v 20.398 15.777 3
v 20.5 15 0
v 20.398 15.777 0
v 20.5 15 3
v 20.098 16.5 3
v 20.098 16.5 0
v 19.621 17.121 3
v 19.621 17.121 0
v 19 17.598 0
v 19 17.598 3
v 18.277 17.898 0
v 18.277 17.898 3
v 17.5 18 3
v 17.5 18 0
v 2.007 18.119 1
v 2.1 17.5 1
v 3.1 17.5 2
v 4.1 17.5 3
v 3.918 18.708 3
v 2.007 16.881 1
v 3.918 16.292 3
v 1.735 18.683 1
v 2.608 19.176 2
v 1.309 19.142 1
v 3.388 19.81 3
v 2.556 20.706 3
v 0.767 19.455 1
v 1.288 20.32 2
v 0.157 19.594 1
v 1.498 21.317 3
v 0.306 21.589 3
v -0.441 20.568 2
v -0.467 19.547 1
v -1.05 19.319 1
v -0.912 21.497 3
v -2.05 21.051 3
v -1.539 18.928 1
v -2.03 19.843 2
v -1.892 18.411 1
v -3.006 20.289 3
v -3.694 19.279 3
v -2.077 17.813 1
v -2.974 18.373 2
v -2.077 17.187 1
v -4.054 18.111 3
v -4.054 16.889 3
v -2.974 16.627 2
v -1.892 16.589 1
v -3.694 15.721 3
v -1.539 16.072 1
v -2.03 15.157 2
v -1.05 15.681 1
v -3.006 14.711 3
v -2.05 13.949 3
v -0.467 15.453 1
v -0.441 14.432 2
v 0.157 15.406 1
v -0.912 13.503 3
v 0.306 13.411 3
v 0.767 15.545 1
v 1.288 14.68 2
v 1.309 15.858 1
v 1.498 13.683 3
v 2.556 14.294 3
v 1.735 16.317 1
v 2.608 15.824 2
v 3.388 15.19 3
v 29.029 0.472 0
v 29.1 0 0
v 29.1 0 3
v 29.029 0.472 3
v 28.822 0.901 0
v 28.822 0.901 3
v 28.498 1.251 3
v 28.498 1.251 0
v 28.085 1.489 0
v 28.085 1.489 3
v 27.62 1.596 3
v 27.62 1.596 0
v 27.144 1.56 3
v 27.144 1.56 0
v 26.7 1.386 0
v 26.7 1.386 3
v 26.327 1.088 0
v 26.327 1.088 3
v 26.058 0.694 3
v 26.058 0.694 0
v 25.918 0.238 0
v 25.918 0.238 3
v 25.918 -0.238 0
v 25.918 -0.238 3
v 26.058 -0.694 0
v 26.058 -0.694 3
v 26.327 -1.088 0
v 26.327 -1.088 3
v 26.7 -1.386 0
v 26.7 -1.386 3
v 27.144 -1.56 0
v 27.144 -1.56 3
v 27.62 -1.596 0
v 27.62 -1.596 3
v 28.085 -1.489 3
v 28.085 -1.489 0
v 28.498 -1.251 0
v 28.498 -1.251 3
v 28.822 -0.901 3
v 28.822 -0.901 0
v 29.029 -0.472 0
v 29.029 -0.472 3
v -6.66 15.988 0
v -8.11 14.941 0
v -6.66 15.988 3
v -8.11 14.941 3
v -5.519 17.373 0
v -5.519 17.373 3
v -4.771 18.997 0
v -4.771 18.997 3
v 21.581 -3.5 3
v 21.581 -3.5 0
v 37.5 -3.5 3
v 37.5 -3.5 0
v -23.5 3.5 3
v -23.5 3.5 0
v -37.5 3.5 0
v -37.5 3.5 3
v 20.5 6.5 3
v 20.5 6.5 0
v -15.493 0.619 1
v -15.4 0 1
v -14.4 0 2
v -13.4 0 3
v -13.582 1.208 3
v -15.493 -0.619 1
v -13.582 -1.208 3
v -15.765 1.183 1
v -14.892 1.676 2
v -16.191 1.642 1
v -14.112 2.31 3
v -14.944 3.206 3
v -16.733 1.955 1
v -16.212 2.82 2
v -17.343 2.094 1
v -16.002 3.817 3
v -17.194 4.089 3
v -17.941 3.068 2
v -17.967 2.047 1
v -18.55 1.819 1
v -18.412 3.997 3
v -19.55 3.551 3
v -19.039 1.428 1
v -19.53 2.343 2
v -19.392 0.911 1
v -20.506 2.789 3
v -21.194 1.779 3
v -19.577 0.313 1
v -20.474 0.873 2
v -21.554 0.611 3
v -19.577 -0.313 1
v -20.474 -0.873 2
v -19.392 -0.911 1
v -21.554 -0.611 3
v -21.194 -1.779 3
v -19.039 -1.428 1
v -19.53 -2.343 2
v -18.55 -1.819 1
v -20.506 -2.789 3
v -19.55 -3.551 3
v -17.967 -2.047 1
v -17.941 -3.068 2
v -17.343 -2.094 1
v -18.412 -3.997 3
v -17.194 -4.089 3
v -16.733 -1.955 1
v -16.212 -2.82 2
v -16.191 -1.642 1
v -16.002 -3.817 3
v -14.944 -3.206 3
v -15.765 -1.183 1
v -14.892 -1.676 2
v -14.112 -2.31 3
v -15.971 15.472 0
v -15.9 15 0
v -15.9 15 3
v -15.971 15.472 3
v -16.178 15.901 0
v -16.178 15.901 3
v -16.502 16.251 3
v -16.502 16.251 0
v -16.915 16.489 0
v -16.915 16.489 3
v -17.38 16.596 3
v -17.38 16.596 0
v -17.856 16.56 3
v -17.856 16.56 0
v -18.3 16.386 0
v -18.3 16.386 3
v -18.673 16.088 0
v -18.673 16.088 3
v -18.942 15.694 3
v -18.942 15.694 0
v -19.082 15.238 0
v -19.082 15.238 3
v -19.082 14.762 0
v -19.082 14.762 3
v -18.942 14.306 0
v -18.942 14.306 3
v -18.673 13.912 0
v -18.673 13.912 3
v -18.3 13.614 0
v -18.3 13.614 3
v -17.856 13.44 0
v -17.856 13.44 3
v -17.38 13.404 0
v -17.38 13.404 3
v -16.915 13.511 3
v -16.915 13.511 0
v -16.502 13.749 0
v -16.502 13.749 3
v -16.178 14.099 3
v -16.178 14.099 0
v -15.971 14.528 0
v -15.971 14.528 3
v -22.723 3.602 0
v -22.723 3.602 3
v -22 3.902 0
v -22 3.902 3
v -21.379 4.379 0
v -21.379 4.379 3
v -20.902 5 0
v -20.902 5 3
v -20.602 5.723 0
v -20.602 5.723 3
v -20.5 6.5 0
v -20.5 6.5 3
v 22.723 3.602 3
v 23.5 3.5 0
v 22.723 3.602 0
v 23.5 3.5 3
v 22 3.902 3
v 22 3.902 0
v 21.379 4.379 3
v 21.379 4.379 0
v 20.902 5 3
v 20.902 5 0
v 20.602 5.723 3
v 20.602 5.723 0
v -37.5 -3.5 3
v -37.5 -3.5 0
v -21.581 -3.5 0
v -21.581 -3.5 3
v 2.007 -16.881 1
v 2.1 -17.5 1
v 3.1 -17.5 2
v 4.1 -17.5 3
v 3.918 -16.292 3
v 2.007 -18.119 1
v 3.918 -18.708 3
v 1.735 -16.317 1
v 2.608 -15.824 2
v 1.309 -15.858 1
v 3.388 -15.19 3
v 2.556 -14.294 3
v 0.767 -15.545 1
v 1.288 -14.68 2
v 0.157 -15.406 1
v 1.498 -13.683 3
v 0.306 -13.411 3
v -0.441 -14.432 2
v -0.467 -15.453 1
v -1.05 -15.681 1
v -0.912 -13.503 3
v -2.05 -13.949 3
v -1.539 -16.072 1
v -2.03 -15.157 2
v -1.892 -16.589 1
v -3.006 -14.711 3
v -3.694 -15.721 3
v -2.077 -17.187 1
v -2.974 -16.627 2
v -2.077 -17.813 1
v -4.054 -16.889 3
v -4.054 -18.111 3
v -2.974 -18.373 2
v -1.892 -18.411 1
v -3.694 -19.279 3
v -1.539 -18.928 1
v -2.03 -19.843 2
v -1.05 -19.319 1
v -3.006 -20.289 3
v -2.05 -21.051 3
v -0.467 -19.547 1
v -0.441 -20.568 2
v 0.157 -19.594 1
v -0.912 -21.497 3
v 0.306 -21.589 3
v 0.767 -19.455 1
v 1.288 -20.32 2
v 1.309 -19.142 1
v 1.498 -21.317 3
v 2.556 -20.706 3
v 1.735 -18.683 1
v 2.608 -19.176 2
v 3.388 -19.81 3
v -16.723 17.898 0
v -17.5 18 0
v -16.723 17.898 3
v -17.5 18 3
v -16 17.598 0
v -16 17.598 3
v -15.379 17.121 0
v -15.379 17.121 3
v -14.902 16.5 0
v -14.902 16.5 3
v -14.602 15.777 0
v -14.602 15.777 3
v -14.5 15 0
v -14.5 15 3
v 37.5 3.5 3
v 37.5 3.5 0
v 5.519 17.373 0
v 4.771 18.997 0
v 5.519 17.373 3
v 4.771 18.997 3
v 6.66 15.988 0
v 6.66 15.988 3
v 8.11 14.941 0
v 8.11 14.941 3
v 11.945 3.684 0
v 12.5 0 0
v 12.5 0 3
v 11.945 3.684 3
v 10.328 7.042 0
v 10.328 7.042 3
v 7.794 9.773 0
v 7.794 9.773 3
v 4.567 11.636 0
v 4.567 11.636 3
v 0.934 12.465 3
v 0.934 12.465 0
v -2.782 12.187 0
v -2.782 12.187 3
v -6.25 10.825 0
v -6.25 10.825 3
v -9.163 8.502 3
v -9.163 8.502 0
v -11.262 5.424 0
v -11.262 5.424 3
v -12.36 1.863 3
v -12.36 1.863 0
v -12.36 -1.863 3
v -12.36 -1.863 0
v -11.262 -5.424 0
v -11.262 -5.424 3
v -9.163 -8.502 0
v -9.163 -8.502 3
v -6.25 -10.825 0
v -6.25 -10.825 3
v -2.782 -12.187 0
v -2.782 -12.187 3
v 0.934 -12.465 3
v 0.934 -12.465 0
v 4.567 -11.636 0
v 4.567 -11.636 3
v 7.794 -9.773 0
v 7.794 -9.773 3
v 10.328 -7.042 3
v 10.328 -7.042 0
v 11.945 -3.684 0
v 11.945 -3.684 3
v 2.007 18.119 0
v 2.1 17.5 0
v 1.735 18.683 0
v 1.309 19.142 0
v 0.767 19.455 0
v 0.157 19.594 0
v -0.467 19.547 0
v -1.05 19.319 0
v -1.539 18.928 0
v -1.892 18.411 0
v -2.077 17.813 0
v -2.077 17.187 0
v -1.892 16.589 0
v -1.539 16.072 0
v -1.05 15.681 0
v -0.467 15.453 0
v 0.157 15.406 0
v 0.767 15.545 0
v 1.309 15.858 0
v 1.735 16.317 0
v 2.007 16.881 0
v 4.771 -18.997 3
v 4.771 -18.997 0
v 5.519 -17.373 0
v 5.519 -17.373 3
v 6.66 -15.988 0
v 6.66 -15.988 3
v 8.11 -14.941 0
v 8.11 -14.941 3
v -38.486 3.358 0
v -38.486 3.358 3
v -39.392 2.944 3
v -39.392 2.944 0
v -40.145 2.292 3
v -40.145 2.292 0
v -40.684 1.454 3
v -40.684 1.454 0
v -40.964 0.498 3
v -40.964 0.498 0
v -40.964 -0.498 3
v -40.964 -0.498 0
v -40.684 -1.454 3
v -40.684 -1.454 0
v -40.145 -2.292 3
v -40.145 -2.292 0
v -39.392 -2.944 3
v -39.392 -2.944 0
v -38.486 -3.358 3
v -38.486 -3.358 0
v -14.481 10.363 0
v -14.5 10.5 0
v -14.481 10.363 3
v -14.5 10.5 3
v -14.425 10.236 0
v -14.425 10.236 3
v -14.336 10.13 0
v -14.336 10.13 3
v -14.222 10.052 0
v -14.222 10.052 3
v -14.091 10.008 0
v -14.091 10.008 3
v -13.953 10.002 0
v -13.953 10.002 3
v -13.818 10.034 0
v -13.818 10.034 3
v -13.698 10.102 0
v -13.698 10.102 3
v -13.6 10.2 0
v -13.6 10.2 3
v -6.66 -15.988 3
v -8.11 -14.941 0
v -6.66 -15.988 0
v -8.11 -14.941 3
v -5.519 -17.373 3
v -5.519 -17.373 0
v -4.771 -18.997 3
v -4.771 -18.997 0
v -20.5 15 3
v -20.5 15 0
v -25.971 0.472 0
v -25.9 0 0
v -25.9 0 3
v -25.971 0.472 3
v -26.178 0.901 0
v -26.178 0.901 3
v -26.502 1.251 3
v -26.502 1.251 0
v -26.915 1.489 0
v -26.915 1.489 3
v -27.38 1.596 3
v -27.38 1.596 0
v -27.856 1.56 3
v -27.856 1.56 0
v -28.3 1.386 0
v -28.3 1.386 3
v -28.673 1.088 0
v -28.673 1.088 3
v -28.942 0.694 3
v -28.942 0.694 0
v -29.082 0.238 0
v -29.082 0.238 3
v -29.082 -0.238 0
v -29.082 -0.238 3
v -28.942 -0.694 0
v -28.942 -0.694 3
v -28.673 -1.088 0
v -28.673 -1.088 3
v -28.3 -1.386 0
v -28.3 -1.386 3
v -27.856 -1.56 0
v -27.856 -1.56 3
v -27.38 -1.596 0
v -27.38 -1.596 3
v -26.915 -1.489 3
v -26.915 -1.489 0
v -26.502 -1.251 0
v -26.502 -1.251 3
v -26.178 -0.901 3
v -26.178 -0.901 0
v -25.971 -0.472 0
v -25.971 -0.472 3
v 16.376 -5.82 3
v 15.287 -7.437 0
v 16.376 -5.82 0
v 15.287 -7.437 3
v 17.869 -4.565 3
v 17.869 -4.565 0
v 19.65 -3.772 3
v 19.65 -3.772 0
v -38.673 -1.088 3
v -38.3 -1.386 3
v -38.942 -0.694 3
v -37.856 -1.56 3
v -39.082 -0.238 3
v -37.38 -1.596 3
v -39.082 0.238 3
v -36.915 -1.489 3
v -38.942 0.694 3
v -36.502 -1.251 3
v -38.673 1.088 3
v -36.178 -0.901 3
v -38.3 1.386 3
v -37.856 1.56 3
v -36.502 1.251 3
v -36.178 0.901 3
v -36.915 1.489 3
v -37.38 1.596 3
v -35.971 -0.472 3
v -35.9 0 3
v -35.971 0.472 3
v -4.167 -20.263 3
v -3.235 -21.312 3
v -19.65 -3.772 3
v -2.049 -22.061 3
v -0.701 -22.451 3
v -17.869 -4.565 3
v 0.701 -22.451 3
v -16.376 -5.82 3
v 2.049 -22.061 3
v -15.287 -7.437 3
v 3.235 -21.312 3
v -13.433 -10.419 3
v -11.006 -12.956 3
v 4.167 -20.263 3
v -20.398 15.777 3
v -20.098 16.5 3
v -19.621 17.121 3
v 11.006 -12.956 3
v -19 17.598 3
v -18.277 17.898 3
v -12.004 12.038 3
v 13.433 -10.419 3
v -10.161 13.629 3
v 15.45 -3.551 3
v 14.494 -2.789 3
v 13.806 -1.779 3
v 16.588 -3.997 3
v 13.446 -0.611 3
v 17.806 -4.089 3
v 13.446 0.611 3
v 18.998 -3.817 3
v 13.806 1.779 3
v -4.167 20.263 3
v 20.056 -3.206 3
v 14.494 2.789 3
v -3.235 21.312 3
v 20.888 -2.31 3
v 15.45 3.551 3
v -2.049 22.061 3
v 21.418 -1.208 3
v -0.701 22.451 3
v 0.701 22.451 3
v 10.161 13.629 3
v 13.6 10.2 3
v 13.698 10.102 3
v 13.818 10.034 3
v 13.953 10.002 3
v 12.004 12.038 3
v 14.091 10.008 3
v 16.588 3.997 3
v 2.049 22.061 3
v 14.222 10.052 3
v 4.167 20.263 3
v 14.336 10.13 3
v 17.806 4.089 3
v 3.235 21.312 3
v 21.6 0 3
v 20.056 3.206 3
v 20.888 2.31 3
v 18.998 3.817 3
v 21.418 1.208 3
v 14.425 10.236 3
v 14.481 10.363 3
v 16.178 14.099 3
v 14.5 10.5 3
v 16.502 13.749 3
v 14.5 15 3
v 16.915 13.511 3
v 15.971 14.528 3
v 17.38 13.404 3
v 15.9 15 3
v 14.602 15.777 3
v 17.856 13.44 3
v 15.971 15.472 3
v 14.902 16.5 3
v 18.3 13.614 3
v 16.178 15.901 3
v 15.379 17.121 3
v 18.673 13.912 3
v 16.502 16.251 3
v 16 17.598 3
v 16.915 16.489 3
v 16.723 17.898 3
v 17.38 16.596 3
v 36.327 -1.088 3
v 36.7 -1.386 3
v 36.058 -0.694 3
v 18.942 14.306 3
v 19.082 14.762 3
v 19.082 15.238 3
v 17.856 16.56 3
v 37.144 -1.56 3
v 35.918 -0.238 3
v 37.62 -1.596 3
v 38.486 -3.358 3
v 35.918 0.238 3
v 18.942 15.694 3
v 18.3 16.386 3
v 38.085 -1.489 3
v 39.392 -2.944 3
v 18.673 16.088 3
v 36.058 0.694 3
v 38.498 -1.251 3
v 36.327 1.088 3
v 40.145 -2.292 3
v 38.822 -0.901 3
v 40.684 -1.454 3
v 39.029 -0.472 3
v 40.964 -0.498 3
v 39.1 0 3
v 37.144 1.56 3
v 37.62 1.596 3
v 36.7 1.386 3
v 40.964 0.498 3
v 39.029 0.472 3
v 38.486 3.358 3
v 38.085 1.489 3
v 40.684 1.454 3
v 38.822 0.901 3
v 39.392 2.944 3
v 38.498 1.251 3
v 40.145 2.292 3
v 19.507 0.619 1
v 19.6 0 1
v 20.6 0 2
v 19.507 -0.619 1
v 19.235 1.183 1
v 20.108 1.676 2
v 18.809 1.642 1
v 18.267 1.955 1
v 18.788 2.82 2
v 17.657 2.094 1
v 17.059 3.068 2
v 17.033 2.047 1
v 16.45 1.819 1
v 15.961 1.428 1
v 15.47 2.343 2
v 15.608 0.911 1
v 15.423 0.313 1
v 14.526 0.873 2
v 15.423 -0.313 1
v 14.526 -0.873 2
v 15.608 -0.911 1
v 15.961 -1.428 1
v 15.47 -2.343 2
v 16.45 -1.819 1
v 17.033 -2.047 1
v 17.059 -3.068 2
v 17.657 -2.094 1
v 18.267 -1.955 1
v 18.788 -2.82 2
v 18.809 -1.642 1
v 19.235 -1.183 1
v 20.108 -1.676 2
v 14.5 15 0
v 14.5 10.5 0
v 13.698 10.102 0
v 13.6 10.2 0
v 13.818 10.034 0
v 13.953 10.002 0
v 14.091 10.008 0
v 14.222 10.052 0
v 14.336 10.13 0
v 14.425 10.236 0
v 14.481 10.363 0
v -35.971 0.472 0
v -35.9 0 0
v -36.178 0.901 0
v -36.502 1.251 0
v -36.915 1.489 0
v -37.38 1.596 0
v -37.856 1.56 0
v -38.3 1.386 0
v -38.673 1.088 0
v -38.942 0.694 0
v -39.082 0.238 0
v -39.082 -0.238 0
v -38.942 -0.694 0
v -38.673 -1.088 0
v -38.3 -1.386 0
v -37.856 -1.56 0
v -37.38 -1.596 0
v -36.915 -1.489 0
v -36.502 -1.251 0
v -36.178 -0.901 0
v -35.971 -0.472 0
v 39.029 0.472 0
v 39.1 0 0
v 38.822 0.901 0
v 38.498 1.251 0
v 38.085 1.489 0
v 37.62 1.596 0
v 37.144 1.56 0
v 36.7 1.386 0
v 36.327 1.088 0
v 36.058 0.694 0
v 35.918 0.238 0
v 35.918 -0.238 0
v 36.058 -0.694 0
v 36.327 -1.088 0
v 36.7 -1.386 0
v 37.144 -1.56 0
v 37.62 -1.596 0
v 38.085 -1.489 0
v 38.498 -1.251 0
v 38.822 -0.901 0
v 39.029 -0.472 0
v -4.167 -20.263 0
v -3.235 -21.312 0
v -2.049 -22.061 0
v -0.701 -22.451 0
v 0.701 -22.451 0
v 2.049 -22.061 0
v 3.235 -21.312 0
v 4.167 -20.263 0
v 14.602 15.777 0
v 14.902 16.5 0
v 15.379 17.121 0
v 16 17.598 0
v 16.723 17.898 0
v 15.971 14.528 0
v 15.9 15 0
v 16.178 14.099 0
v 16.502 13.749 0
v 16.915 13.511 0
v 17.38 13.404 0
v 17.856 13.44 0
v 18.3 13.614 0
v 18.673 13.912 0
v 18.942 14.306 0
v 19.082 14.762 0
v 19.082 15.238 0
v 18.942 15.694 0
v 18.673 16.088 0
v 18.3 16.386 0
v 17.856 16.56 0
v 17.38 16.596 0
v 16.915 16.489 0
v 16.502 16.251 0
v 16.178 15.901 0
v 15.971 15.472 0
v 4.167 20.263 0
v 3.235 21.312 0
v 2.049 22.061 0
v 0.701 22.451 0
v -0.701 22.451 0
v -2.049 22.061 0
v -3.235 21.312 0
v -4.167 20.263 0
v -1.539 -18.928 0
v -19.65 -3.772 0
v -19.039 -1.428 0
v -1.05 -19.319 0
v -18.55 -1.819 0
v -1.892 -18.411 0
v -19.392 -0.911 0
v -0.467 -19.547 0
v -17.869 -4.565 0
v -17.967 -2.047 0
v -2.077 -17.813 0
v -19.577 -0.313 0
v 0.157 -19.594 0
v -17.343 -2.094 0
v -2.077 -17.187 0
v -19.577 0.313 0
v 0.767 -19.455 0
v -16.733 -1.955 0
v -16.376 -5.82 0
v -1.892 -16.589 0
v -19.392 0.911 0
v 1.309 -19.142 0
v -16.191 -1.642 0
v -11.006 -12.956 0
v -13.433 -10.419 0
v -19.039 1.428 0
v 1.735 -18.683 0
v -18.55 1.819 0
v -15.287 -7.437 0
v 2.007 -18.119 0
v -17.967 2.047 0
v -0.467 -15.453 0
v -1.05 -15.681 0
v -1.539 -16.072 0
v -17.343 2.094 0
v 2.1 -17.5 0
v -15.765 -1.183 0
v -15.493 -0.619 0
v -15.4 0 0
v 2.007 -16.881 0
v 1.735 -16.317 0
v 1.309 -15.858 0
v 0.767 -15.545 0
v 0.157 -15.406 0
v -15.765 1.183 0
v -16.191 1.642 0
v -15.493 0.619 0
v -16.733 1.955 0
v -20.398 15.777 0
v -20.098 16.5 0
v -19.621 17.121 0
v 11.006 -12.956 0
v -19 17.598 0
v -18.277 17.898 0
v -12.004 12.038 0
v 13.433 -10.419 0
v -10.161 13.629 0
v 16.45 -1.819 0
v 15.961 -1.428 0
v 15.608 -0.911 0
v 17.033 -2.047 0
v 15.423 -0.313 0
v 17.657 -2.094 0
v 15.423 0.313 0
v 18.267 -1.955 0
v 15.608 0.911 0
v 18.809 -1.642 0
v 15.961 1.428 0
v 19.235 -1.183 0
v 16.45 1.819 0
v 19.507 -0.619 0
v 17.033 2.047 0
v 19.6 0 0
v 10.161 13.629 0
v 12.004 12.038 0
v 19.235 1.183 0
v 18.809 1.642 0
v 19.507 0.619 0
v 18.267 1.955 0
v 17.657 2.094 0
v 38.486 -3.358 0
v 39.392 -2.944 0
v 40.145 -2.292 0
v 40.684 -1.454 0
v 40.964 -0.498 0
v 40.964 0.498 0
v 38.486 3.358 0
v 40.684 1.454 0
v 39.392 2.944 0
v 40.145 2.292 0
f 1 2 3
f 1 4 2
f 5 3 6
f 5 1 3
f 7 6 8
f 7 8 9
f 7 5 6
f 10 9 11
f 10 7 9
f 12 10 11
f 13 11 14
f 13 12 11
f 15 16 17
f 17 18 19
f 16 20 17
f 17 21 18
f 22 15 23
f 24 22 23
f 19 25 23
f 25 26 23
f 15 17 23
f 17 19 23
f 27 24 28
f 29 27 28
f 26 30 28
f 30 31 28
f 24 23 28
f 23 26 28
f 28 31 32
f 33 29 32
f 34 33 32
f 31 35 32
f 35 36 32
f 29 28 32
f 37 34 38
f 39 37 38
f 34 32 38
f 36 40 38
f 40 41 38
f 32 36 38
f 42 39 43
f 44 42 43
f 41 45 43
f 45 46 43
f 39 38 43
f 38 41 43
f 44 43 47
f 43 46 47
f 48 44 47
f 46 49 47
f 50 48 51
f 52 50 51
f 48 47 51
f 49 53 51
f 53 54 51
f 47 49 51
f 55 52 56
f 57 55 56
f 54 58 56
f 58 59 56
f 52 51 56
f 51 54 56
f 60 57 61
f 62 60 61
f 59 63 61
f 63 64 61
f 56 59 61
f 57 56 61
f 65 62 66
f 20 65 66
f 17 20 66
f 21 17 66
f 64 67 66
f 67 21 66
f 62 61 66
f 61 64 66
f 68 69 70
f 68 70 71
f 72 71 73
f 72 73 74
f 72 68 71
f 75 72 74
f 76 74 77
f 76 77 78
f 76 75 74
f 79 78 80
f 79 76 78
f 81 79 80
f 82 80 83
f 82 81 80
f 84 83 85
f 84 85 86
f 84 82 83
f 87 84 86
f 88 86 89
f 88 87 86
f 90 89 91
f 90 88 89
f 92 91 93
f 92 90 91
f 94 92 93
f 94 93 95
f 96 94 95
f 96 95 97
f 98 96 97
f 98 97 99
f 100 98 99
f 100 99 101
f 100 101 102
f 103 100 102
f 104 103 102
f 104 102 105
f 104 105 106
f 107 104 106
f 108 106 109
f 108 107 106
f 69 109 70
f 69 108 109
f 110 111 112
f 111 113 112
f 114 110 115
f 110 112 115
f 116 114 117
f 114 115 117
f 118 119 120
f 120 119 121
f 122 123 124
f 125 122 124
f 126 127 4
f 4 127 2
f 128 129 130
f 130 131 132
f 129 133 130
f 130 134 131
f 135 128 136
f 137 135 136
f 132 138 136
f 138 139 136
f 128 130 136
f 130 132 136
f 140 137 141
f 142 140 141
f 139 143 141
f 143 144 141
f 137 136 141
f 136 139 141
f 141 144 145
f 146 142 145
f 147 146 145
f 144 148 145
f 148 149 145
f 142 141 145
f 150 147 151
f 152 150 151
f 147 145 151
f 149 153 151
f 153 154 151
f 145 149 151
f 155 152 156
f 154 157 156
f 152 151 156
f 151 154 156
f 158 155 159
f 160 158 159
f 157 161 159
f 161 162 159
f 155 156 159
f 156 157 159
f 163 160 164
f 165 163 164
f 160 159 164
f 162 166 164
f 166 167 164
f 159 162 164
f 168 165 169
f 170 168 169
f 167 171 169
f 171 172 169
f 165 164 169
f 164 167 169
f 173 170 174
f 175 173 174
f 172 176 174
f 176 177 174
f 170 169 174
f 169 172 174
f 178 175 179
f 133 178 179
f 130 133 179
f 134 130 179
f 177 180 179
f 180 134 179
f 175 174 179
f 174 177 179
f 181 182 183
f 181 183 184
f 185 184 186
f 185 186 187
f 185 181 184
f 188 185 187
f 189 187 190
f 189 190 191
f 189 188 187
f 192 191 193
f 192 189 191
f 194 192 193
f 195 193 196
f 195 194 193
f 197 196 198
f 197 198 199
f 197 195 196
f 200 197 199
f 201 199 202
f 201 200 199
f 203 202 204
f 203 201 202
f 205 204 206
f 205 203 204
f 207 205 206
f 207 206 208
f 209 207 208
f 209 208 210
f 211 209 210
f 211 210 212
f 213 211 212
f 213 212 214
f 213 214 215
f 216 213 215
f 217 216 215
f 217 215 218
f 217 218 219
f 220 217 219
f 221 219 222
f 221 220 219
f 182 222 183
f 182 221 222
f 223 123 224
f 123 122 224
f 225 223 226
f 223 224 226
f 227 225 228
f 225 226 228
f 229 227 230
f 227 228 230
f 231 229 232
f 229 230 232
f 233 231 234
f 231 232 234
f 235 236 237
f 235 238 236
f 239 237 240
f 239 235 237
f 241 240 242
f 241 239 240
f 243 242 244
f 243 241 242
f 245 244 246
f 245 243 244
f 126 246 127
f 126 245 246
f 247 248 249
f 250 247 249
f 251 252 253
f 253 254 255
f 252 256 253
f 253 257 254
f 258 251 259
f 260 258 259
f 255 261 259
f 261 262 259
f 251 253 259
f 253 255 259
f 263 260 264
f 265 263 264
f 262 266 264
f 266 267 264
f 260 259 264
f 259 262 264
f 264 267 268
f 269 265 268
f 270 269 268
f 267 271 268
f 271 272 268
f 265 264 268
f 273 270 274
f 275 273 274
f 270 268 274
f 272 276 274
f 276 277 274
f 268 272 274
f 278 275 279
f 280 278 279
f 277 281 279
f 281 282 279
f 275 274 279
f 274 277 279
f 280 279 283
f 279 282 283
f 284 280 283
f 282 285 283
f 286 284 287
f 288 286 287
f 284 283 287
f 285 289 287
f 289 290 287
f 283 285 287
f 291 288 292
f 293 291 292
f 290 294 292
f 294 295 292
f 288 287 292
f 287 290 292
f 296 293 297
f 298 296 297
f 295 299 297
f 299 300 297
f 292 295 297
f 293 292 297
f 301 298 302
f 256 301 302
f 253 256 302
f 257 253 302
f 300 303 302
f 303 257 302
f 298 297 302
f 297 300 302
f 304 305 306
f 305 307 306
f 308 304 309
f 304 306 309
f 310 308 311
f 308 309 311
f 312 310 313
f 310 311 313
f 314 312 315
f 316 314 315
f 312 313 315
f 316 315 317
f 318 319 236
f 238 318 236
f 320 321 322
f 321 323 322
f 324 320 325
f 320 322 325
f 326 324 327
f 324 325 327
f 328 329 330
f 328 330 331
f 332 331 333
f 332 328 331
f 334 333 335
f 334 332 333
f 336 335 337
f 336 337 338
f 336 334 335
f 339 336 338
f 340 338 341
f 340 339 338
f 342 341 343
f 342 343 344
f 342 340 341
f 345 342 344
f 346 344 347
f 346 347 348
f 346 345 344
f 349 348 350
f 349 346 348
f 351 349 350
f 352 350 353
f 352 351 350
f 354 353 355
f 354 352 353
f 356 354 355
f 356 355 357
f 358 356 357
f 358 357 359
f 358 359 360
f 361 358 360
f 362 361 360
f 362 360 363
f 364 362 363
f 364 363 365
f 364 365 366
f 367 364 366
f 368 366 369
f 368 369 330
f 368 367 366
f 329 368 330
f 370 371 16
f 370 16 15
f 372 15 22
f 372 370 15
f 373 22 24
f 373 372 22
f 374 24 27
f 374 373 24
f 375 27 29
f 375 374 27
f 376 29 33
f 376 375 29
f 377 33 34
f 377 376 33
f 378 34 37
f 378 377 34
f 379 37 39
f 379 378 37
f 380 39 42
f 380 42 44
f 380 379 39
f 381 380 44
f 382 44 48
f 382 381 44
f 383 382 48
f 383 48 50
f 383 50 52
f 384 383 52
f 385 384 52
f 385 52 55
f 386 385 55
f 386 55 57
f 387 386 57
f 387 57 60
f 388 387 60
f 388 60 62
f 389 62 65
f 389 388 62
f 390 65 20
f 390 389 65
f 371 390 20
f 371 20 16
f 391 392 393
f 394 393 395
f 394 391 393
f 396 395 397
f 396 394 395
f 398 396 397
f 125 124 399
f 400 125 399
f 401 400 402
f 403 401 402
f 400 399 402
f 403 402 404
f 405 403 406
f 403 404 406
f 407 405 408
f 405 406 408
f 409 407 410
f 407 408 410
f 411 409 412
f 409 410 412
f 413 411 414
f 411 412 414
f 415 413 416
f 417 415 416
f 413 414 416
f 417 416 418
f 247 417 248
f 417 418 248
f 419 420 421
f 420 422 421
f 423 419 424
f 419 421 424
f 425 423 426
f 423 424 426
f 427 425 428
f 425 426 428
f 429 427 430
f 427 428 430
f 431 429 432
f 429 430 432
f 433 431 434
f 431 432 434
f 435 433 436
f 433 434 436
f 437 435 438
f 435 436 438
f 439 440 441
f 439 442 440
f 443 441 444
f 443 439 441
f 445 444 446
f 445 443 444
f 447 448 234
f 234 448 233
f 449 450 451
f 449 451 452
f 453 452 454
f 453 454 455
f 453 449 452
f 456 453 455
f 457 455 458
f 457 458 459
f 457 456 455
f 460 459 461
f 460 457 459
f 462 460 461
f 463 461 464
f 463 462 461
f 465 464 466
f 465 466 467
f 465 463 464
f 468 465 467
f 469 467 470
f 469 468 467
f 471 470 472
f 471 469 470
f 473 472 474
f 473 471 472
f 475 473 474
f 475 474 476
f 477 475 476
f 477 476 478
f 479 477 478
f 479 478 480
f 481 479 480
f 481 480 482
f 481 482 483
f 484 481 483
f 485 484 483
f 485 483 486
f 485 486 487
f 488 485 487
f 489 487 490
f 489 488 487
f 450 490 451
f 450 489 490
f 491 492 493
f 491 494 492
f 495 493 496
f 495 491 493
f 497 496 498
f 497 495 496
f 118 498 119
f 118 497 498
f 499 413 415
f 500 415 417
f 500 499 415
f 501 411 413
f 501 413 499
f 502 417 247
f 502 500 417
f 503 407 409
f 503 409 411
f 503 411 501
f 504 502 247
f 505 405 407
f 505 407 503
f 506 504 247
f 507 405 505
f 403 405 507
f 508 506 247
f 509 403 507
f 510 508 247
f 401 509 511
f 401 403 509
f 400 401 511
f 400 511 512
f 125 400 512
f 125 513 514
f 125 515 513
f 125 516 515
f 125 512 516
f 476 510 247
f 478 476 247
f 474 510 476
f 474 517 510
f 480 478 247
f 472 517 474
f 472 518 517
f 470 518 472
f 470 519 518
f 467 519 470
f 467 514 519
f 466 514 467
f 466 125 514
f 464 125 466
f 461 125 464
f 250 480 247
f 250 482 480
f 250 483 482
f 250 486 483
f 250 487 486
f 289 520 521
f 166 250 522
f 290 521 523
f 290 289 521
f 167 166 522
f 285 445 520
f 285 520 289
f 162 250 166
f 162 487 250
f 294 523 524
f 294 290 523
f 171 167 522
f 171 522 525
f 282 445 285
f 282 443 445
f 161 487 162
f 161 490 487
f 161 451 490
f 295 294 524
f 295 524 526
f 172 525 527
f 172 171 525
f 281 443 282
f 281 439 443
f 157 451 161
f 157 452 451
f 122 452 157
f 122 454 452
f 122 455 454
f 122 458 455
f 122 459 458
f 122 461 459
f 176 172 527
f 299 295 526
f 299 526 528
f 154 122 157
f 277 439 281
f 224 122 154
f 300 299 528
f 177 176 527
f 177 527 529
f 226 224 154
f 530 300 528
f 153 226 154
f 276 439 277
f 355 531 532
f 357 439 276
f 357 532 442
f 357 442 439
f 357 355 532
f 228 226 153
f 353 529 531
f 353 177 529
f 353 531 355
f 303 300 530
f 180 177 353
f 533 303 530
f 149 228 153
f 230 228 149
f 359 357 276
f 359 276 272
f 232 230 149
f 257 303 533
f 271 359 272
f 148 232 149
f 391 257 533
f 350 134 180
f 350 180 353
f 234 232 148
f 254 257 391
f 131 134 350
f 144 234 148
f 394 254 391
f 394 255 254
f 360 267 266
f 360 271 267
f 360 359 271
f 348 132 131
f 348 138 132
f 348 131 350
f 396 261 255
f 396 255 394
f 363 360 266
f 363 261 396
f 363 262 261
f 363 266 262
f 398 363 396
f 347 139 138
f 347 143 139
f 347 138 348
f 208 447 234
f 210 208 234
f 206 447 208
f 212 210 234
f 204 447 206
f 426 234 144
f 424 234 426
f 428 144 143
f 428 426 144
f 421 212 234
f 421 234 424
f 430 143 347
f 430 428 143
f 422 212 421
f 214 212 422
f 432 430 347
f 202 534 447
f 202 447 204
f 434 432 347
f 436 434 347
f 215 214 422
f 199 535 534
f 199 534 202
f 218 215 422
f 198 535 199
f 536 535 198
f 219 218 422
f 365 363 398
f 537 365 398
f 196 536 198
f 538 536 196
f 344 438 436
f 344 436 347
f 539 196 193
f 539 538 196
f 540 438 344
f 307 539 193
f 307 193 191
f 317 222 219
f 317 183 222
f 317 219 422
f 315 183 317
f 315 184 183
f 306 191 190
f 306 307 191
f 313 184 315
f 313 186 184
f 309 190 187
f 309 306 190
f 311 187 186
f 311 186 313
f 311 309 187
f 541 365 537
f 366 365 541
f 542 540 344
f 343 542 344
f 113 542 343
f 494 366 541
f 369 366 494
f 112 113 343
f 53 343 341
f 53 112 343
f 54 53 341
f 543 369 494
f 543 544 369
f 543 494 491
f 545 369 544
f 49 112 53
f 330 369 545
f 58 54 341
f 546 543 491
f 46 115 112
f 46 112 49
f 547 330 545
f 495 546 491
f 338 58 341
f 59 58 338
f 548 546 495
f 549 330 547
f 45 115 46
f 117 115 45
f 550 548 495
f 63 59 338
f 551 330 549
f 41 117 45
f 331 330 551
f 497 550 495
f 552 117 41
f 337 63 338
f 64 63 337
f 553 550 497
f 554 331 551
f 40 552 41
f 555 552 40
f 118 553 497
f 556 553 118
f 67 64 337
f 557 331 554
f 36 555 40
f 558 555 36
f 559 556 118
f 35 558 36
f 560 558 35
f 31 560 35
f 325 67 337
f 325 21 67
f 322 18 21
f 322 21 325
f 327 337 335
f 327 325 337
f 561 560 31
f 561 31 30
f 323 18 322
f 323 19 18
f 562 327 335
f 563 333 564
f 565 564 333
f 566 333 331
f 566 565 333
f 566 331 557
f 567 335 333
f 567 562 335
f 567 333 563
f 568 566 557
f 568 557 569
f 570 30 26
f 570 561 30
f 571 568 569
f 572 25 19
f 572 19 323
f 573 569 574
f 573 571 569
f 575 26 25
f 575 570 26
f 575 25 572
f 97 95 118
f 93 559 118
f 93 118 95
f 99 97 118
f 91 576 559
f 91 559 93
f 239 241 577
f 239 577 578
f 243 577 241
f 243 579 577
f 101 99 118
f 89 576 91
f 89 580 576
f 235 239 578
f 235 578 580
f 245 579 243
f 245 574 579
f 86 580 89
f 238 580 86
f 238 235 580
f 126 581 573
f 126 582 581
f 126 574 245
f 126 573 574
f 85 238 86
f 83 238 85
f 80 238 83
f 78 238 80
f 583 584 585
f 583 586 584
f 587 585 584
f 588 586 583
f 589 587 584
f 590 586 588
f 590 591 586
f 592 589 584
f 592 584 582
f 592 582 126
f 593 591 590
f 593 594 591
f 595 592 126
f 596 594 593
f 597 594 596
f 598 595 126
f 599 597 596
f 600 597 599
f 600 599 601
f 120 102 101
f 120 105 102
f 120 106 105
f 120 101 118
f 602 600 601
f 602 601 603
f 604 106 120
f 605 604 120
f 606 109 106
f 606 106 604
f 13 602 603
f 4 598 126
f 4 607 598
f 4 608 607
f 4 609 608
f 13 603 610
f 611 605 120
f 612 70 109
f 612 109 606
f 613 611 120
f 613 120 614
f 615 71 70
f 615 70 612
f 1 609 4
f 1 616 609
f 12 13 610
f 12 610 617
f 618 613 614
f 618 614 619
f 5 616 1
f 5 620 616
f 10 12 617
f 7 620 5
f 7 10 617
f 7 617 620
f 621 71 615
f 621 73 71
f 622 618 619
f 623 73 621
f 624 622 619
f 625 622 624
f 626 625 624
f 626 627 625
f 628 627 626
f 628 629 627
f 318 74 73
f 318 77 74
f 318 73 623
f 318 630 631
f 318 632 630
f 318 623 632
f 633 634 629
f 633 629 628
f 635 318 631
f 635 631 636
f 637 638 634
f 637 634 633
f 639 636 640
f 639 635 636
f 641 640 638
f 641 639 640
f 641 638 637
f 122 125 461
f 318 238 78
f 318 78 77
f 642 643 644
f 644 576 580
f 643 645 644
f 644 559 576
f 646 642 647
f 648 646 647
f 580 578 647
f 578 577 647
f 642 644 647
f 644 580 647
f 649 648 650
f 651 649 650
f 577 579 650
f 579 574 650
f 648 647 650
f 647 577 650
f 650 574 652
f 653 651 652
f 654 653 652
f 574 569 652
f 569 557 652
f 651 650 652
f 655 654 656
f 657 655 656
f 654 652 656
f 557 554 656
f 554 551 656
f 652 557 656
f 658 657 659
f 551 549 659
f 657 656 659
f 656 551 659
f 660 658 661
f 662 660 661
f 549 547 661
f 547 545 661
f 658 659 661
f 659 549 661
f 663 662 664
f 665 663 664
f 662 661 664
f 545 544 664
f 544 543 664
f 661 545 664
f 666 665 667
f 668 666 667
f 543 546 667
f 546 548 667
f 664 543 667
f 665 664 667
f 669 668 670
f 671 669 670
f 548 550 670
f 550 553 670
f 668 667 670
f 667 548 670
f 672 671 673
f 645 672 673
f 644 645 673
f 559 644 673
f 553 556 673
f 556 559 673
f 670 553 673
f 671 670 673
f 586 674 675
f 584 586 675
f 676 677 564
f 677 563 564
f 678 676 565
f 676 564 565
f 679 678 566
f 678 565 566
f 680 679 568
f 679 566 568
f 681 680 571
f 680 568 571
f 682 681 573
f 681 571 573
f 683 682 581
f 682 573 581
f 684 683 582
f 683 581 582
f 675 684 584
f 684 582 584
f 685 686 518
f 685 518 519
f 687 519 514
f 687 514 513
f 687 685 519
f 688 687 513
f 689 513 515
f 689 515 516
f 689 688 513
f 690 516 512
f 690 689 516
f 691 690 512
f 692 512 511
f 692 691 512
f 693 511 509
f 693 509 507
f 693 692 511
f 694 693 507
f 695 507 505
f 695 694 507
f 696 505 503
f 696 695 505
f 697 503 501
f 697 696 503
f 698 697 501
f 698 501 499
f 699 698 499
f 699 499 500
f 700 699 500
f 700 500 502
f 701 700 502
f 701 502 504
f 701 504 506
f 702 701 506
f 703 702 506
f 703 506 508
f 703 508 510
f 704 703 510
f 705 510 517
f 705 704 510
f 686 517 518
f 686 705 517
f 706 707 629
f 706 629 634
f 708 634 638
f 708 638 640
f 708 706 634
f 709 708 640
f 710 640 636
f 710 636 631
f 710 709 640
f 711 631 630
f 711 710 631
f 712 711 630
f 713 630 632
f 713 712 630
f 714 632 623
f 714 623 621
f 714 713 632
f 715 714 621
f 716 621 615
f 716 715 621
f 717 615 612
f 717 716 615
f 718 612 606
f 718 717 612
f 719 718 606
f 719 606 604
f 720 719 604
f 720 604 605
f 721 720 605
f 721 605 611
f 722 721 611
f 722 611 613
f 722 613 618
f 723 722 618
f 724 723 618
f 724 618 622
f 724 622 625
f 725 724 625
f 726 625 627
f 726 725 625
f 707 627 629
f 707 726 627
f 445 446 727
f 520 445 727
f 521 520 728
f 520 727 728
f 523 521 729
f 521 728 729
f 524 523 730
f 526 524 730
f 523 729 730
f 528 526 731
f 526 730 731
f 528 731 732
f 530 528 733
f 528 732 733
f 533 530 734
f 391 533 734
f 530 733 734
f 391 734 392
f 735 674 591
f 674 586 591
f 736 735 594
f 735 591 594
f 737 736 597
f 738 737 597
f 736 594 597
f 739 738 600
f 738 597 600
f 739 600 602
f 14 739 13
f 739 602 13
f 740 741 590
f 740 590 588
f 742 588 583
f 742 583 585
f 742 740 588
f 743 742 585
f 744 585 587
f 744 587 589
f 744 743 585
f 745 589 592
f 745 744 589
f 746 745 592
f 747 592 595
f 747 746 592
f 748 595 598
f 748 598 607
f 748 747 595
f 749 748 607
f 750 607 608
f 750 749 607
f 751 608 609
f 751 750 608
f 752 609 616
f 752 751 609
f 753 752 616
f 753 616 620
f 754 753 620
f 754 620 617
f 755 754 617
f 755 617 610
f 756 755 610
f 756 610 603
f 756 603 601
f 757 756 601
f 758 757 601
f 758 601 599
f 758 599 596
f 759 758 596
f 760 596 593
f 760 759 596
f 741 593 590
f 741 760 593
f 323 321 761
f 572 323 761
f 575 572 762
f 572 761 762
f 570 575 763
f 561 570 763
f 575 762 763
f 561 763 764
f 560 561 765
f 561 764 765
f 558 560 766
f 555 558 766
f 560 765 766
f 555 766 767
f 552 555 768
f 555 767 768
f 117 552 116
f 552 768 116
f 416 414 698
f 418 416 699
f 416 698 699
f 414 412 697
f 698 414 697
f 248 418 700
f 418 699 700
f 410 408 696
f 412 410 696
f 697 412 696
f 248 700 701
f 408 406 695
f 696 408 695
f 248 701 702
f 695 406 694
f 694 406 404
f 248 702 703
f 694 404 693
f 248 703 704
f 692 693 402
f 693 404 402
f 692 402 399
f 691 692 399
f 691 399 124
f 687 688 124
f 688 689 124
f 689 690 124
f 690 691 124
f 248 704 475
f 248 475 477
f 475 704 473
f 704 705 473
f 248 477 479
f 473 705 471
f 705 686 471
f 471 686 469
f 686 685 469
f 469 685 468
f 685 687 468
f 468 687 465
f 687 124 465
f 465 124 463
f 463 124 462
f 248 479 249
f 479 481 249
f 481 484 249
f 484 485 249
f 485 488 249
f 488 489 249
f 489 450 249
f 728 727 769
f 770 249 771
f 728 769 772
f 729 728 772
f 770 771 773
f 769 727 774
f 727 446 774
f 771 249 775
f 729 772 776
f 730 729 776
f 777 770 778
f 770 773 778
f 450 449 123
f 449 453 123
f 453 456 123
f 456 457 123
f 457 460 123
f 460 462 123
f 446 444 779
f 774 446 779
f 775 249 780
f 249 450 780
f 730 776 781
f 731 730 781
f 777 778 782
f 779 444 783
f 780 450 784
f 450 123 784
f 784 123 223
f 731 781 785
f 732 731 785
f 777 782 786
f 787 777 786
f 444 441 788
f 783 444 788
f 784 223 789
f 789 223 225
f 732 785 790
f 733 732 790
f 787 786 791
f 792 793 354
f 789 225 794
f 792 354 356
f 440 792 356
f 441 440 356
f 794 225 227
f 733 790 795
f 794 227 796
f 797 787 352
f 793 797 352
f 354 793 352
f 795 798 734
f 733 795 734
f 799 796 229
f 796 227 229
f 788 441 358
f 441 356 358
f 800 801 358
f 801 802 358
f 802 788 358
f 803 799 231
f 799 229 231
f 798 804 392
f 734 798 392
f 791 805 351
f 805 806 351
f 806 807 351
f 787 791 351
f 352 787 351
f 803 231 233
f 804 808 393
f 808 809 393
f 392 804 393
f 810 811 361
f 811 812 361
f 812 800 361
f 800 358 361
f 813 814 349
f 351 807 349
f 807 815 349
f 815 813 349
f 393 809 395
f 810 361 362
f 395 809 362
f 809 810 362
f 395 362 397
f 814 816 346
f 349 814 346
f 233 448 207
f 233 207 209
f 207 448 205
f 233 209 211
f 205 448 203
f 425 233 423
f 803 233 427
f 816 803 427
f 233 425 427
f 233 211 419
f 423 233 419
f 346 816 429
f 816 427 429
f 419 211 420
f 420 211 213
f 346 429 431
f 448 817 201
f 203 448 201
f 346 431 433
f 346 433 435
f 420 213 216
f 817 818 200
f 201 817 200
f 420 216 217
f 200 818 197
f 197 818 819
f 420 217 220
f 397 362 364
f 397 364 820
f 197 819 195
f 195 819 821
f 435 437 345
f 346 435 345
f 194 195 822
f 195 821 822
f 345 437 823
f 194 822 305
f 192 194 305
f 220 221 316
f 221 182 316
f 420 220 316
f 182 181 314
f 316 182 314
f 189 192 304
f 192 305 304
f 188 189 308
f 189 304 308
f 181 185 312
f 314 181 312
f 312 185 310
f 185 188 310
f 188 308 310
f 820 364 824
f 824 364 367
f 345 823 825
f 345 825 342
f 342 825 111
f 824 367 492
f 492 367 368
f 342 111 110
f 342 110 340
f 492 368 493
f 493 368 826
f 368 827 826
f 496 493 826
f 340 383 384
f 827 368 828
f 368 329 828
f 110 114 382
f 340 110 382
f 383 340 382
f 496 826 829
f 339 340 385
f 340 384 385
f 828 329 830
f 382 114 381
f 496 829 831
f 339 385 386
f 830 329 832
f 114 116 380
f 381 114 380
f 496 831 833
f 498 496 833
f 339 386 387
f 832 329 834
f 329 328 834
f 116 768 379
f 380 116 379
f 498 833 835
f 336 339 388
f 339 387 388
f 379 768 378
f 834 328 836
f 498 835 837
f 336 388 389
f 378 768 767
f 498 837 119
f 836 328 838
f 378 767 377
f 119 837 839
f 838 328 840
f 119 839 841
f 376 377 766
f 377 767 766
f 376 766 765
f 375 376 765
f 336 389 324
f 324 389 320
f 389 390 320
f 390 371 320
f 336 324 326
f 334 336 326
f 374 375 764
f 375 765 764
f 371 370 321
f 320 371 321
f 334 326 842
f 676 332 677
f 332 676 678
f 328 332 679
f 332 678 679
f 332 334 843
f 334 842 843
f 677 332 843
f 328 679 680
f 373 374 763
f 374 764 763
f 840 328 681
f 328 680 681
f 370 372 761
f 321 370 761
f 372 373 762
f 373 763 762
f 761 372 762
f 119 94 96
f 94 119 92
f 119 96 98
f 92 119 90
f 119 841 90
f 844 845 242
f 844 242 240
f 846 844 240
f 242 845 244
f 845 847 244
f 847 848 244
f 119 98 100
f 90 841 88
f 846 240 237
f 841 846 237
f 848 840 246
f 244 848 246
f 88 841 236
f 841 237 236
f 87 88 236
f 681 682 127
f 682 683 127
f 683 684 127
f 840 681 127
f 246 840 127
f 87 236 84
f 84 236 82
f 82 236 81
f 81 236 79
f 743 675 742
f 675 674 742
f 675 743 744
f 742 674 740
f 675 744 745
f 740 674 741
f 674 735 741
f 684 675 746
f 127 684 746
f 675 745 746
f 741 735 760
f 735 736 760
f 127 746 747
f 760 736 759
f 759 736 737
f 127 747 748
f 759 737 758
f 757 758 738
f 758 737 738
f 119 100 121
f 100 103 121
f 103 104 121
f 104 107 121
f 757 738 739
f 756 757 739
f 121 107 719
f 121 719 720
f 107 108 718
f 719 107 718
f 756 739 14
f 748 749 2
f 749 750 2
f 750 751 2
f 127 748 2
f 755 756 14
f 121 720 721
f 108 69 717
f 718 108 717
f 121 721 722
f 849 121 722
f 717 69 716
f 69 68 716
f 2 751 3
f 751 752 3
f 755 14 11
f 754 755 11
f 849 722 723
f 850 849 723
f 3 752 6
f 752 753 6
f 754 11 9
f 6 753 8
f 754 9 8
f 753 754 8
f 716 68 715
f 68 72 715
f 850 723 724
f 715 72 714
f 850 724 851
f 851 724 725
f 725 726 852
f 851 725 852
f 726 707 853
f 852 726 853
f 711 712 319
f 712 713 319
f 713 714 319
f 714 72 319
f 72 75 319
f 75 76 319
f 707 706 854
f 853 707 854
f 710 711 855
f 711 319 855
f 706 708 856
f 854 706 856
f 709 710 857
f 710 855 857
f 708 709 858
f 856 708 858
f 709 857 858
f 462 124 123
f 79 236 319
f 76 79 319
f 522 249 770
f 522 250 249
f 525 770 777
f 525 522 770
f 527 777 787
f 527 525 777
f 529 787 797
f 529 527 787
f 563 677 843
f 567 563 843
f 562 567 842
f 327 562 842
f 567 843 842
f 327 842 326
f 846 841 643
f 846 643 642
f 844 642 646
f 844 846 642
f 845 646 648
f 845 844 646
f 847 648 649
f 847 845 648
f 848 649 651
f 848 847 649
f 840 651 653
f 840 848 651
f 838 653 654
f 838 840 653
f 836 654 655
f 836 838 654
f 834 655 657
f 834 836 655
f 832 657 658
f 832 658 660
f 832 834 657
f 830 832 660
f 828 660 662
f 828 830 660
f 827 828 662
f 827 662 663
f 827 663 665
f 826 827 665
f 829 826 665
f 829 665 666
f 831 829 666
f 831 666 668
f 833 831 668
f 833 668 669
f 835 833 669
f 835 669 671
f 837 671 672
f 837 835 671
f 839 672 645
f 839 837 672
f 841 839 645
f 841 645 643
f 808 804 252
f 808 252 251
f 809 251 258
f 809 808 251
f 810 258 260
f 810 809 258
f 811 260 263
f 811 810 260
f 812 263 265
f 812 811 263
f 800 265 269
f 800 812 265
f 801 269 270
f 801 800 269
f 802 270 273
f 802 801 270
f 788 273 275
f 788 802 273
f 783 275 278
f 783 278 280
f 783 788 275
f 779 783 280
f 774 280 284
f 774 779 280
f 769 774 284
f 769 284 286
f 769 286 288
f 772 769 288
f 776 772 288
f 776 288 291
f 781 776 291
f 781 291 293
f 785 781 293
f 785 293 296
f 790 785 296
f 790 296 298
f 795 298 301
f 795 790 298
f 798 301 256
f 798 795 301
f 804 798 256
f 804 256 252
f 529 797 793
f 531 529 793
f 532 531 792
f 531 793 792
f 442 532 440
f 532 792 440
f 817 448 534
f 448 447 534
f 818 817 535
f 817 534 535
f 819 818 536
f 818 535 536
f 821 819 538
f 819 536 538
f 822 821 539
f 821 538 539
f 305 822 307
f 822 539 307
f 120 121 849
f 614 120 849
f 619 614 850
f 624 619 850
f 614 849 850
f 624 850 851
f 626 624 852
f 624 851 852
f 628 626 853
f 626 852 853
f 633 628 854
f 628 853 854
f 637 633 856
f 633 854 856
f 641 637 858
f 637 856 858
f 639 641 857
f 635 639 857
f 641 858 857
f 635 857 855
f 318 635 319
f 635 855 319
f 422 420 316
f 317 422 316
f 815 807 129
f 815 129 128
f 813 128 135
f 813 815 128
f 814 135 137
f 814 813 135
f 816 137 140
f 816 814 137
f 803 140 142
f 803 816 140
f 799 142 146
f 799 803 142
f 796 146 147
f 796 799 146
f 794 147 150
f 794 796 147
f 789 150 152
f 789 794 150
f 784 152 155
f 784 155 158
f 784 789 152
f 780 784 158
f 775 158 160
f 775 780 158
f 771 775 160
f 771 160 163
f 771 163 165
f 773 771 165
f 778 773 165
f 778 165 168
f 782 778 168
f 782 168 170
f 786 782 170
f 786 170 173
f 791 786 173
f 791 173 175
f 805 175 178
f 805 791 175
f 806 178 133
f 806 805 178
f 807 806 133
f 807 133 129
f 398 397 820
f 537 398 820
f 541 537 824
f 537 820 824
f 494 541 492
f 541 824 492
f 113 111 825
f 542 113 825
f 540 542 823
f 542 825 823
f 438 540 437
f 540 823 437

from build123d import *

# Parameters (mm, degrees)
SKETCH_1_R      = 12.5
SKETCH_1_R_2    = 2.1
SKETCH_1_R_3    = 1.6
EXTRUDE_1_DEPTH = 3
FILLET_2_R      = 7
FILLET_3_R      = 3
FILLET_4_R      = 0.5
CHAMFER_1_SIZE  = 2


with BuildPart() as part:
    # ｽｹｯﾁ1 → ﾎﾞｽ - 押し出し1 (new body)
    with BuildSketch(Plane.XY):
        with BuildLine():
            Line((-37.5, -3.5), (-16.63580476, -3.5))
            ThreePointArc((-16.63580476, -3.5), (-12.503868825, -11.517519889), (-4.852092963, -16.292857143))
            ThreePointArc((-4.852092963, -16.292857143), (0, -22.5), (4.852092963, -16.292857143))
            ThreePointArc((4.852092963, -16.292857143), (12.503868825, -11.517519889), (16.63580476, -3.5))
            Line((16.63580476, -3.5), (37.5, -3.5))
            ThreePointArc((37.5, -3.5), (41, 0), (37.5, 3.5))
            Line((37.5, 3.5), (20.5, 3.5))
            Line((20.5, 3.5), (20.5, 18))
            Line((20.5, 18), (14.5, 18))
            Line((14.5, 18), (14.5, 8.874119675))
            ThreePointArc((14.5, 8.874119675), (10.362687485, 13.476450129), (4.852092963, 16.292857143))
            ThreePointArc((4.852092963, 16.292857143), (0, 22.5), (-4.852092963, 16.292857143))
            ThreePointArc((-4.852092963, 16.292857143), (-10.362687485, 13.476450129), (-14.5, 8.874119675))
            Line((-14.5, 8.874119675), (-14.5, 18))
            Line((-14.5, 18), (-20.5, 18))
            Line((-20.5, 18), (-20.5, 3.5))
            Line((-20.5, 3.5), (-37.5, 3.5))
            ThreePointArc((-37.5, 3.5), (-41, 0), (-37.5, -3.5))
        make_face()
        Circle(SKETCH_1_R, mode=Mode.SUBTRACT)
        with Locations((0, 17.5)):
            Circle(SKETCH_1_R_2, mode=Mode.SUBTRACT)
        with Locations((-17.5, 0)):
            Circle(SKETCH_1_R_2, mode=Mode.SUBTRACT)
        with Locations((0, -17.5)):
            Circle(SKETCH_1_R_2, mode=Mode.SUBTRACT)
        with Locations((17.5, 0)):
            Circle(SKETCH_1_R_2, mode=Mode.SUBTRACT)
        with Locations((-27.5, 0)):
            Circle(SKETCH_1_R_3, mode=Mode.SUBTRACT)
        with Locations((-37.5, 0)):
            Circle(SKETCH_1_R_3, mode=Mode.SUBTRACT)
        with Locations((27.5, 0)):
            Circle(SKETCH_1_R_3, mode=Mode.SUBTRACT)
        with Locations((37.5, 0)):
            Circle(SKETCH_1_R_3, mode=Mode.SUBTRACT)
        with Locations((-17.5, 15)):
            Circle(SKETCH_1_R_3, mode=Mode.SUBTRACT)
        with Locations(Location((17.5, 15, 0), (0, 0, 180))):
            Circle(SKETCH_1_R_3, mode=Mode.SUBTRACT)
    extrude(amount=EXTRUDE_1_DEPTH)

    # ﾌｨﾚｯﾄ2
    fillet_2_edges = [part.edges().sort_by_distance(p)[0] for p in [
        (-4.852092963, 16.292857143, 1.5),
        (4.852092963, 16.292857143, 1.5),
        (16.63580476, -3.5, 1.5),
        (4.852092963, -16.292857143, 1.5),
        (-4.852092963, -16.292857143, 1.5),
        (-16.63580476, -3.5, 1.5),
    ]]
    fillet(fillet_2_edges, radius=FILLET_2_R)

    # ﾌｨﾚｯﾄ3
    fillet_3_edges = [part.edges().sort_by_distance(p)[0] for p in [
        (20.5, 18, 1.5),
        (14.5, 18, 1.5),
        (20.5, 3.5, 1.5),
        (-14.5, 18, 1.5),
        (-20.5, 18, 1.5),
        (-20.5, 3.5, 1.5),
    ]]
    fillet(fillet_3_edges, radius=FILLET_3_R - 0.0001)  # a hair under: the kernel refuses the full size

    # ﾌｨﾚｯﾄ4
    fillet_4_edges = [part.edges().sort_by_distance(p)[0] for p in [
        (14.5, 8.874119675, 1.5),
        (-14.5, 8.874119675, 1.5),
    ]]
    fillet(fillet_4_edges, radius=FILLET_4_R)

    # 面取り1
    chamfer_1_edges = [part.edges().sort_by_distance(p)[0] for p in [
        (-2.1, 17.5, 3),
        (-19.6, 0, 3),
        (-2.1, -17.5, 3),
        (15.4, 0, 3),
    ]]
    chamfer(chamfer_1_edges, length=CHAMFER_1_SIZE)


solid = part.part
